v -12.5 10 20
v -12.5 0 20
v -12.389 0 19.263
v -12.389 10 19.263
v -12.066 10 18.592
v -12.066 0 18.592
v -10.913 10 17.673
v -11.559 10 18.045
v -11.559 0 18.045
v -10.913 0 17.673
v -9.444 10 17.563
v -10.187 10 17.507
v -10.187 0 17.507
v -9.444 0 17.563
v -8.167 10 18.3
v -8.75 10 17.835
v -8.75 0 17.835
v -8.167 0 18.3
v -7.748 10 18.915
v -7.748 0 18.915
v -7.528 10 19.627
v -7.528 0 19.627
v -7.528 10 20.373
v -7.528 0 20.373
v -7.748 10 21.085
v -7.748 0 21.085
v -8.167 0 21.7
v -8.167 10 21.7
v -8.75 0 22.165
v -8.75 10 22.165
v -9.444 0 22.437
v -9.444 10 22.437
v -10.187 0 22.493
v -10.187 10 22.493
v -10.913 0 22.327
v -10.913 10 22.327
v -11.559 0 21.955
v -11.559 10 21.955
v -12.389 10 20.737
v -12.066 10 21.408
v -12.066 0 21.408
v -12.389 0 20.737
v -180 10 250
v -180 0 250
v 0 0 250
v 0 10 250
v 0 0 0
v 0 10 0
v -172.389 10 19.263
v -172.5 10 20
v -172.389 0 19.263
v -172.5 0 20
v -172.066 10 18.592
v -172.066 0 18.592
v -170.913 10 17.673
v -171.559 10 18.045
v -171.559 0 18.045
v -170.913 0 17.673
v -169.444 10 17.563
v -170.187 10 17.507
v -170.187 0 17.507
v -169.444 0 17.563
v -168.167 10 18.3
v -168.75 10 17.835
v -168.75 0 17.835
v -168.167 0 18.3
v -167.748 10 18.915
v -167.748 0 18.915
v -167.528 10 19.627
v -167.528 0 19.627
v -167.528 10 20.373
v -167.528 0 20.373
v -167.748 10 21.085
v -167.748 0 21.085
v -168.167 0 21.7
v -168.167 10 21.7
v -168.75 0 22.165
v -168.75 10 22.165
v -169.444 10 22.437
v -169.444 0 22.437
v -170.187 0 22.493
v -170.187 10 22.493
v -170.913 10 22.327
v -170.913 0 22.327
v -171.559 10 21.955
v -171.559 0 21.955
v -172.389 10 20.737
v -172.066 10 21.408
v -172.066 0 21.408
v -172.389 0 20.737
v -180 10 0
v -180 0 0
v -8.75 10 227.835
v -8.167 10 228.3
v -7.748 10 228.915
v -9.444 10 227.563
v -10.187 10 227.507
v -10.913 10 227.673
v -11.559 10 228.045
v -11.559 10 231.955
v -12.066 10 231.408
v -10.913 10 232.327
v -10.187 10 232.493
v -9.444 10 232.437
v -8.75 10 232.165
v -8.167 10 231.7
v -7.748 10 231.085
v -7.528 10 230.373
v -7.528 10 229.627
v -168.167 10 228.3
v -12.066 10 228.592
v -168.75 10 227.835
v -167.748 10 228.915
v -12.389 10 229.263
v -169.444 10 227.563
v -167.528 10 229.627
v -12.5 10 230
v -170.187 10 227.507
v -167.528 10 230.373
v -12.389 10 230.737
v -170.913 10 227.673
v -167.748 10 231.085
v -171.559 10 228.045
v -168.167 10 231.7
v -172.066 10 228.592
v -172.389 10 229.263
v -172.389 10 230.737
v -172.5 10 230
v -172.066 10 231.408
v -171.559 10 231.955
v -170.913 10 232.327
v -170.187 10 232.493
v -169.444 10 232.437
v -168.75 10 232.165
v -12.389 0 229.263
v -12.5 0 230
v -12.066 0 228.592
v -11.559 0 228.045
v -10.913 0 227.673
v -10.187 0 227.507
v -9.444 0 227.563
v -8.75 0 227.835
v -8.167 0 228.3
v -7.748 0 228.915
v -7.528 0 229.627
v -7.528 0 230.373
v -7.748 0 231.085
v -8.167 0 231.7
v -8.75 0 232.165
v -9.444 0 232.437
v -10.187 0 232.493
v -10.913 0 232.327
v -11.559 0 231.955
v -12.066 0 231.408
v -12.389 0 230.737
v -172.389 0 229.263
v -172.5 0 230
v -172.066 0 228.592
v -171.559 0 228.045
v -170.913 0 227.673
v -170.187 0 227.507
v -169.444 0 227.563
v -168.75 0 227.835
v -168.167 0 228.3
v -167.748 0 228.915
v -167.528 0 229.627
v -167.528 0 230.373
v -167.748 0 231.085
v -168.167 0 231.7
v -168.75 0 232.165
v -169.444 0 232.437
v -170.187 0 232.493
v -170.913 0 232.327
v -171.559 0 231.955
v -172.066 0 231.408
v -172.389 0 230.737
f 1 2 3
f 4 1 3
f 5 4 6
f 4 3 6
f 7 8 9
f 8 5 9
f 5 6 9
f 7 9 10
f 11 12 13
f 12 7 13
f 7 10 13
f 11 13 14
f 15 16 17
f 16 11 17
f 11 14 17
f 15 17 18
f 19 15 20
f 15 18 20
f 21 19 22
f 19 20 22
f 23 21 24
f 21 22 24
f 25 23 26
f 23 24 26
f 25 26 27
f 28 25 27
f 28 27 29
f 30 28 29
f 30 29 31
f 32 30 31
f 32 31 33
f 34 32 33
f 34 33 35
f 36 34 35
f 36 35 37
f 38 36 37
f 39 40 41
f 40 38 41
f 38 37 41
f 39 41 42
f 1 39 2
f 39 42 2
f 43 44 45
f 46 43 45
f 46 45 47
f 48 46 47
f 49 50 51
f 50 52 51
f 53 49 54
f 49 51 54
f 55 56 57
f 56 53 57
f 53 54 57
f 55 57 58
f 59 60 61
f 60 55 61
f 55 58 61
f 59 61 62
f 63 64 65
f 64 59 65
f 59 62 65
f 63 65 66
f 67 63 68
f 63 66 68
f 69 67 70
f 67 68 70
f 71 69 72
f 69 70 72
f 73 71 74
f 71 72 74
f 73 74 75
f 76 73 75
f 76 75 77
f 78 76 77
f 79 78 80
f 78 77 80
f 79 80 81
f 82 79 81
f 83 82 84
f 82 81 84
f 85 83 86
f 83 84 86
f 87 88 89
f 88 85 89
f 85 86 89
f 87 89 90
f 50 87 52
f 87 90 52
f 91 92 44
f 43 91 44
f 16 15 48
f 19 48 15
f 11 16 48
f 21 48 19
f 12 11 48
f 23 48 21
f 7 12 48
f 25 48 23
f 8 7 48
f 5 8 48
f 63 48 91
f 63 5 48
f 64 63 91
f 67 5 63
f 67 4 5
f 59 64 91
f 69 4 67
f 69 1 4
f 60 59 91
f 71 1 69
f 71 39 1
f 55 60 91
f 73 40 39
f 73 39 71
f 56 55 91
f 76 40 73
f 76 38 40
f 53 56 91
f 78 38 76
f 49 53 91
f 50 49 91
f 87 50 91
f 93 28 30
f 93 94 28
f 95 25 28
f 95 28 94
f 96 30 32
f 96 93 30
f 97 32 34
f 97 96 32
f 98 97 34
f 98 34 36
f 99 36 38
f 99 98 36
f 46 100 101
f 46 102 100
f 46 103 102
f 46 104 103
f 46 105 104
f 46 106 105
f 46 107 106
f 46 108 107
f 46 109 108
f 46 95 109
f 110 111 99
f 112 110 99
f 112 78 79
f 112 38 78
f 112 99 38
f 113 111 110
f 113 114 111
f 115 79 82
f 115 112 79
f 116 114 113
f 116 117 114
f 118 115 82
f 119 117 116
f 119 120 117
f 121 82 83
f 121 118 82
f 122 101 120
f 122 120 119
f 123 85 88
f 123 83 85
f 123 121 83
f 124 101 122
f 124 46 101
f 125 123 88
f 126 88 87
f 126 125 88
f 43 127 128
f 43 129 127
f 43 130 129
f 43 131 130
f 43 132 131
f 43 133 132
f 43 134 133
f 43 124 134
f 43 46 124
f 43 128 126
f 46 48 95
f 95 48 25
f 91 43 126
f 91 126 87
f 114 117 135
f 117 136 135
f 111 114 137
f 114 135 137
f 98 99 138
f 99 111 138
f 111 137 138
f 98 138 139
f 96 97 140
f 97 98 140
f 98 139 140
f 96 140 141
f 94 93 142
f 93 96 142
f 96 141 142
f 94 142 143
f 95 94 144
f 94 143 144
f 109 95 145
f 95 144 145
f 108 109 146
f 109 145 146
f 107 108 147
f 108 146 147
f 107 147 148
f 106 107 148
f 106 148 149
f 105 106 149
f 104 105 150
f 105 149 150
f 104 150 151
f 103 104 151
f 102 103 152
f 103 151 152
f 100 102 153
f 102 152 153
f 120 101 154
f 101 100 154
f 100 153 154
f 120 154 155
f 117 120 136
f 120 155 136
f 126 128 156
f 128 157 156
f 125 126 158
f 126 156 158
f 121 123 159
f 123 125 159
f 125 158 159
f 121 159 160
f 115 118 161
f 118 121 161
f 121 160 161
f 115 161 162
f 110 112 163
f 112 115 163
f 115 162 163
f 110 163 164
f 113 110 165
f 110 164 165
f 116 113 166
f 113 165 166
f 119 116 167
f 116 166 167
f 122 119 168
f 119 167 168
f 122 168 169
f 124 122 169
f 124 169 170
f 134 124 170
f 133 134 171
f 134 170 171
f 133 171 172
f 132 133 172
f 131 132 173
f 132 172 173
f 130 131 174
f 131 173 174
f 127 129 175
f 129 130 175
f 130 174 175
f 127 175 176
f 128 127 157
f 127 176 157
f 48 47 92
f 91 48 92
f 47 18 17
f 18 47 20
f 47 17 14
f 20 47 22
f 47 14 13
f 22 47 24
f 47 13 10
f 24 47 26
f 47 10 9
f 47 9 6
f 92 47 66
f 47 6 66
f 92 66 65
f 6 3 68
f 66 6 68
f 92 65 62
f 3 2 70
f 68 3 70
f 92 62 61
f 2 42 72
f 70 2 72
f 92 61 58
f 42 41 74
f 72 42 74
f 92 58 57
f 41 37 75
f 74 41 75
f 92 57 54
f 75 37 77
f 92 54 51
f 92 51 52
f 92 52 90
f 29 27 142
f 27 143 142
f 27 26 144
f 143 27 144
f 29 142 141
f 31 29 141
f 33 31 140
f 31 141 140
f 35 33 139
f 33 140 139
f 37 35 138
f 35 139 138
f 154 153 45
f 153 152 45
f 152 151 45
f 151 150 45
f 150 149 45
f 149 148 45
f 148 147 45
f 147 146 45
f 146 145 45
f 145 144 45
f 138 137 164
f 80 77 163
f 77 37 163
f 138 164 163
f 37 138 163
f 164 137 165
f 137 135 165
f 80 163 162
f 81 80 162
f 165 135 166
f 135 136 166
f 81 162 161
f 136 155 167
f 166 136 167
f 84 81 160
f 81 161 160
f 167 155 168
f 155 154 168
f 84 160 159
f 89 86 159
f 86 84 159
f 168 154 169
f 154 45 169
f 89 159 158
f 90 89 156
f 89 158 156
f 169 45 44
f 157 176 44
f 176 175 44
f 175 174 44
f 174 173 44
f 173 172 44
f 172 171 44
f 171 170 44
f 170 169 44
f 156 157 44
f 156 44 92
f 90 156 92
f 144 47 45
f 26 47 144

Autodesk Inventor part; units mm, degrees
ref_plane "YZ Plane" through (0, 0, 0) normal (1, 0, 0) x (0, 1, 0)
ref_plane "XZ Plane" through (0, 0, 0) normal (0, 1, 0) x (-1, 0, 0)
ref_plane "XY Plane" through (0, 0, 0) normal (0, 0, 1) x (1, 0, 0)
sketch "Block1" plane through (0, 0, 0) normal (0, 0, 1) x (1, 0, 0)
  line L0 (0.22, -250.22) -> (-180.22, -250.22)
  line L1 (-180.22, -250.22) -> (-180.22, 0.22)
  line L2 (-180.22, 0.22) -> (0.22, 0.22)
  line L3 (0.22, 0.22) -> (0.22, -250.22)
  circle A0 centre (-10, -230) radius 2.72
  circle A1 centre (-10, -20) radius 2.72
  circle A2 centre (-170, -20) radius 2.72
  circle A3 centre (-170, -230) radius 2.72
  point P0 (-90, -125)
sketch "Sketch1" plane through (0, 0, 0) normal (0, 1, 0) x (-1, 0, 0)
  line L0 (0, 0) -> (180, 0)
  line L1 (180, 0) -> (180, 250)
  line L2 (180, 250) -> (0, 250)
  line L3 (0, 250) -> (0, 0)
  circle A0 centre (170, 230) radius 2.5
  line L4 (90, 267.688) -> (90, -13.7422)
  line L5 (215.5014, 125) -> (-35.5429, 125)
  circle A1 centre (10, 230) radius 2.5
  circle A2 centre (170, 20) radius 2.5
  circle A3 centre (10, 20) radius 2.5
  dimension "d1" = 250
  dimension "d2" = 180
  dimension "d5" = 5
  dimension "d6" = 10
  dimension "d7" = 20
  dimension "d8" = 90
  dimension "d9" = 125
extrude "Extrusion2" add sketch "Sketch1" along normal blind 10
sketch "Sketch2" plane through (0, 10, 0) normal (0, 1, 0) x (1, 0, 0)
  circle A0 centre (-10, -20) radius 2.5 projected
  circle A1 centre (-170, -20) radius 2.5 projected
  circle A2 centre (-10, -230) radius 2.5 projected
  circle A3 centre (-170, -230) radius 2.5 projected
  line L0 (0, 0) -> (-180, 0) projected
  line L1 (-180, 0) -> (-180, -250) projected
  line L2 (-180, -250) -> (0, -250) projected
  line L3 (0, -250) -> (0, 0) projected
sketch "DXF" plane through (0, 0, 0) normal (0, 1, 0) x (-1, 0, 0)
  point P0 (0, 0)
properties part number "guardplate"
